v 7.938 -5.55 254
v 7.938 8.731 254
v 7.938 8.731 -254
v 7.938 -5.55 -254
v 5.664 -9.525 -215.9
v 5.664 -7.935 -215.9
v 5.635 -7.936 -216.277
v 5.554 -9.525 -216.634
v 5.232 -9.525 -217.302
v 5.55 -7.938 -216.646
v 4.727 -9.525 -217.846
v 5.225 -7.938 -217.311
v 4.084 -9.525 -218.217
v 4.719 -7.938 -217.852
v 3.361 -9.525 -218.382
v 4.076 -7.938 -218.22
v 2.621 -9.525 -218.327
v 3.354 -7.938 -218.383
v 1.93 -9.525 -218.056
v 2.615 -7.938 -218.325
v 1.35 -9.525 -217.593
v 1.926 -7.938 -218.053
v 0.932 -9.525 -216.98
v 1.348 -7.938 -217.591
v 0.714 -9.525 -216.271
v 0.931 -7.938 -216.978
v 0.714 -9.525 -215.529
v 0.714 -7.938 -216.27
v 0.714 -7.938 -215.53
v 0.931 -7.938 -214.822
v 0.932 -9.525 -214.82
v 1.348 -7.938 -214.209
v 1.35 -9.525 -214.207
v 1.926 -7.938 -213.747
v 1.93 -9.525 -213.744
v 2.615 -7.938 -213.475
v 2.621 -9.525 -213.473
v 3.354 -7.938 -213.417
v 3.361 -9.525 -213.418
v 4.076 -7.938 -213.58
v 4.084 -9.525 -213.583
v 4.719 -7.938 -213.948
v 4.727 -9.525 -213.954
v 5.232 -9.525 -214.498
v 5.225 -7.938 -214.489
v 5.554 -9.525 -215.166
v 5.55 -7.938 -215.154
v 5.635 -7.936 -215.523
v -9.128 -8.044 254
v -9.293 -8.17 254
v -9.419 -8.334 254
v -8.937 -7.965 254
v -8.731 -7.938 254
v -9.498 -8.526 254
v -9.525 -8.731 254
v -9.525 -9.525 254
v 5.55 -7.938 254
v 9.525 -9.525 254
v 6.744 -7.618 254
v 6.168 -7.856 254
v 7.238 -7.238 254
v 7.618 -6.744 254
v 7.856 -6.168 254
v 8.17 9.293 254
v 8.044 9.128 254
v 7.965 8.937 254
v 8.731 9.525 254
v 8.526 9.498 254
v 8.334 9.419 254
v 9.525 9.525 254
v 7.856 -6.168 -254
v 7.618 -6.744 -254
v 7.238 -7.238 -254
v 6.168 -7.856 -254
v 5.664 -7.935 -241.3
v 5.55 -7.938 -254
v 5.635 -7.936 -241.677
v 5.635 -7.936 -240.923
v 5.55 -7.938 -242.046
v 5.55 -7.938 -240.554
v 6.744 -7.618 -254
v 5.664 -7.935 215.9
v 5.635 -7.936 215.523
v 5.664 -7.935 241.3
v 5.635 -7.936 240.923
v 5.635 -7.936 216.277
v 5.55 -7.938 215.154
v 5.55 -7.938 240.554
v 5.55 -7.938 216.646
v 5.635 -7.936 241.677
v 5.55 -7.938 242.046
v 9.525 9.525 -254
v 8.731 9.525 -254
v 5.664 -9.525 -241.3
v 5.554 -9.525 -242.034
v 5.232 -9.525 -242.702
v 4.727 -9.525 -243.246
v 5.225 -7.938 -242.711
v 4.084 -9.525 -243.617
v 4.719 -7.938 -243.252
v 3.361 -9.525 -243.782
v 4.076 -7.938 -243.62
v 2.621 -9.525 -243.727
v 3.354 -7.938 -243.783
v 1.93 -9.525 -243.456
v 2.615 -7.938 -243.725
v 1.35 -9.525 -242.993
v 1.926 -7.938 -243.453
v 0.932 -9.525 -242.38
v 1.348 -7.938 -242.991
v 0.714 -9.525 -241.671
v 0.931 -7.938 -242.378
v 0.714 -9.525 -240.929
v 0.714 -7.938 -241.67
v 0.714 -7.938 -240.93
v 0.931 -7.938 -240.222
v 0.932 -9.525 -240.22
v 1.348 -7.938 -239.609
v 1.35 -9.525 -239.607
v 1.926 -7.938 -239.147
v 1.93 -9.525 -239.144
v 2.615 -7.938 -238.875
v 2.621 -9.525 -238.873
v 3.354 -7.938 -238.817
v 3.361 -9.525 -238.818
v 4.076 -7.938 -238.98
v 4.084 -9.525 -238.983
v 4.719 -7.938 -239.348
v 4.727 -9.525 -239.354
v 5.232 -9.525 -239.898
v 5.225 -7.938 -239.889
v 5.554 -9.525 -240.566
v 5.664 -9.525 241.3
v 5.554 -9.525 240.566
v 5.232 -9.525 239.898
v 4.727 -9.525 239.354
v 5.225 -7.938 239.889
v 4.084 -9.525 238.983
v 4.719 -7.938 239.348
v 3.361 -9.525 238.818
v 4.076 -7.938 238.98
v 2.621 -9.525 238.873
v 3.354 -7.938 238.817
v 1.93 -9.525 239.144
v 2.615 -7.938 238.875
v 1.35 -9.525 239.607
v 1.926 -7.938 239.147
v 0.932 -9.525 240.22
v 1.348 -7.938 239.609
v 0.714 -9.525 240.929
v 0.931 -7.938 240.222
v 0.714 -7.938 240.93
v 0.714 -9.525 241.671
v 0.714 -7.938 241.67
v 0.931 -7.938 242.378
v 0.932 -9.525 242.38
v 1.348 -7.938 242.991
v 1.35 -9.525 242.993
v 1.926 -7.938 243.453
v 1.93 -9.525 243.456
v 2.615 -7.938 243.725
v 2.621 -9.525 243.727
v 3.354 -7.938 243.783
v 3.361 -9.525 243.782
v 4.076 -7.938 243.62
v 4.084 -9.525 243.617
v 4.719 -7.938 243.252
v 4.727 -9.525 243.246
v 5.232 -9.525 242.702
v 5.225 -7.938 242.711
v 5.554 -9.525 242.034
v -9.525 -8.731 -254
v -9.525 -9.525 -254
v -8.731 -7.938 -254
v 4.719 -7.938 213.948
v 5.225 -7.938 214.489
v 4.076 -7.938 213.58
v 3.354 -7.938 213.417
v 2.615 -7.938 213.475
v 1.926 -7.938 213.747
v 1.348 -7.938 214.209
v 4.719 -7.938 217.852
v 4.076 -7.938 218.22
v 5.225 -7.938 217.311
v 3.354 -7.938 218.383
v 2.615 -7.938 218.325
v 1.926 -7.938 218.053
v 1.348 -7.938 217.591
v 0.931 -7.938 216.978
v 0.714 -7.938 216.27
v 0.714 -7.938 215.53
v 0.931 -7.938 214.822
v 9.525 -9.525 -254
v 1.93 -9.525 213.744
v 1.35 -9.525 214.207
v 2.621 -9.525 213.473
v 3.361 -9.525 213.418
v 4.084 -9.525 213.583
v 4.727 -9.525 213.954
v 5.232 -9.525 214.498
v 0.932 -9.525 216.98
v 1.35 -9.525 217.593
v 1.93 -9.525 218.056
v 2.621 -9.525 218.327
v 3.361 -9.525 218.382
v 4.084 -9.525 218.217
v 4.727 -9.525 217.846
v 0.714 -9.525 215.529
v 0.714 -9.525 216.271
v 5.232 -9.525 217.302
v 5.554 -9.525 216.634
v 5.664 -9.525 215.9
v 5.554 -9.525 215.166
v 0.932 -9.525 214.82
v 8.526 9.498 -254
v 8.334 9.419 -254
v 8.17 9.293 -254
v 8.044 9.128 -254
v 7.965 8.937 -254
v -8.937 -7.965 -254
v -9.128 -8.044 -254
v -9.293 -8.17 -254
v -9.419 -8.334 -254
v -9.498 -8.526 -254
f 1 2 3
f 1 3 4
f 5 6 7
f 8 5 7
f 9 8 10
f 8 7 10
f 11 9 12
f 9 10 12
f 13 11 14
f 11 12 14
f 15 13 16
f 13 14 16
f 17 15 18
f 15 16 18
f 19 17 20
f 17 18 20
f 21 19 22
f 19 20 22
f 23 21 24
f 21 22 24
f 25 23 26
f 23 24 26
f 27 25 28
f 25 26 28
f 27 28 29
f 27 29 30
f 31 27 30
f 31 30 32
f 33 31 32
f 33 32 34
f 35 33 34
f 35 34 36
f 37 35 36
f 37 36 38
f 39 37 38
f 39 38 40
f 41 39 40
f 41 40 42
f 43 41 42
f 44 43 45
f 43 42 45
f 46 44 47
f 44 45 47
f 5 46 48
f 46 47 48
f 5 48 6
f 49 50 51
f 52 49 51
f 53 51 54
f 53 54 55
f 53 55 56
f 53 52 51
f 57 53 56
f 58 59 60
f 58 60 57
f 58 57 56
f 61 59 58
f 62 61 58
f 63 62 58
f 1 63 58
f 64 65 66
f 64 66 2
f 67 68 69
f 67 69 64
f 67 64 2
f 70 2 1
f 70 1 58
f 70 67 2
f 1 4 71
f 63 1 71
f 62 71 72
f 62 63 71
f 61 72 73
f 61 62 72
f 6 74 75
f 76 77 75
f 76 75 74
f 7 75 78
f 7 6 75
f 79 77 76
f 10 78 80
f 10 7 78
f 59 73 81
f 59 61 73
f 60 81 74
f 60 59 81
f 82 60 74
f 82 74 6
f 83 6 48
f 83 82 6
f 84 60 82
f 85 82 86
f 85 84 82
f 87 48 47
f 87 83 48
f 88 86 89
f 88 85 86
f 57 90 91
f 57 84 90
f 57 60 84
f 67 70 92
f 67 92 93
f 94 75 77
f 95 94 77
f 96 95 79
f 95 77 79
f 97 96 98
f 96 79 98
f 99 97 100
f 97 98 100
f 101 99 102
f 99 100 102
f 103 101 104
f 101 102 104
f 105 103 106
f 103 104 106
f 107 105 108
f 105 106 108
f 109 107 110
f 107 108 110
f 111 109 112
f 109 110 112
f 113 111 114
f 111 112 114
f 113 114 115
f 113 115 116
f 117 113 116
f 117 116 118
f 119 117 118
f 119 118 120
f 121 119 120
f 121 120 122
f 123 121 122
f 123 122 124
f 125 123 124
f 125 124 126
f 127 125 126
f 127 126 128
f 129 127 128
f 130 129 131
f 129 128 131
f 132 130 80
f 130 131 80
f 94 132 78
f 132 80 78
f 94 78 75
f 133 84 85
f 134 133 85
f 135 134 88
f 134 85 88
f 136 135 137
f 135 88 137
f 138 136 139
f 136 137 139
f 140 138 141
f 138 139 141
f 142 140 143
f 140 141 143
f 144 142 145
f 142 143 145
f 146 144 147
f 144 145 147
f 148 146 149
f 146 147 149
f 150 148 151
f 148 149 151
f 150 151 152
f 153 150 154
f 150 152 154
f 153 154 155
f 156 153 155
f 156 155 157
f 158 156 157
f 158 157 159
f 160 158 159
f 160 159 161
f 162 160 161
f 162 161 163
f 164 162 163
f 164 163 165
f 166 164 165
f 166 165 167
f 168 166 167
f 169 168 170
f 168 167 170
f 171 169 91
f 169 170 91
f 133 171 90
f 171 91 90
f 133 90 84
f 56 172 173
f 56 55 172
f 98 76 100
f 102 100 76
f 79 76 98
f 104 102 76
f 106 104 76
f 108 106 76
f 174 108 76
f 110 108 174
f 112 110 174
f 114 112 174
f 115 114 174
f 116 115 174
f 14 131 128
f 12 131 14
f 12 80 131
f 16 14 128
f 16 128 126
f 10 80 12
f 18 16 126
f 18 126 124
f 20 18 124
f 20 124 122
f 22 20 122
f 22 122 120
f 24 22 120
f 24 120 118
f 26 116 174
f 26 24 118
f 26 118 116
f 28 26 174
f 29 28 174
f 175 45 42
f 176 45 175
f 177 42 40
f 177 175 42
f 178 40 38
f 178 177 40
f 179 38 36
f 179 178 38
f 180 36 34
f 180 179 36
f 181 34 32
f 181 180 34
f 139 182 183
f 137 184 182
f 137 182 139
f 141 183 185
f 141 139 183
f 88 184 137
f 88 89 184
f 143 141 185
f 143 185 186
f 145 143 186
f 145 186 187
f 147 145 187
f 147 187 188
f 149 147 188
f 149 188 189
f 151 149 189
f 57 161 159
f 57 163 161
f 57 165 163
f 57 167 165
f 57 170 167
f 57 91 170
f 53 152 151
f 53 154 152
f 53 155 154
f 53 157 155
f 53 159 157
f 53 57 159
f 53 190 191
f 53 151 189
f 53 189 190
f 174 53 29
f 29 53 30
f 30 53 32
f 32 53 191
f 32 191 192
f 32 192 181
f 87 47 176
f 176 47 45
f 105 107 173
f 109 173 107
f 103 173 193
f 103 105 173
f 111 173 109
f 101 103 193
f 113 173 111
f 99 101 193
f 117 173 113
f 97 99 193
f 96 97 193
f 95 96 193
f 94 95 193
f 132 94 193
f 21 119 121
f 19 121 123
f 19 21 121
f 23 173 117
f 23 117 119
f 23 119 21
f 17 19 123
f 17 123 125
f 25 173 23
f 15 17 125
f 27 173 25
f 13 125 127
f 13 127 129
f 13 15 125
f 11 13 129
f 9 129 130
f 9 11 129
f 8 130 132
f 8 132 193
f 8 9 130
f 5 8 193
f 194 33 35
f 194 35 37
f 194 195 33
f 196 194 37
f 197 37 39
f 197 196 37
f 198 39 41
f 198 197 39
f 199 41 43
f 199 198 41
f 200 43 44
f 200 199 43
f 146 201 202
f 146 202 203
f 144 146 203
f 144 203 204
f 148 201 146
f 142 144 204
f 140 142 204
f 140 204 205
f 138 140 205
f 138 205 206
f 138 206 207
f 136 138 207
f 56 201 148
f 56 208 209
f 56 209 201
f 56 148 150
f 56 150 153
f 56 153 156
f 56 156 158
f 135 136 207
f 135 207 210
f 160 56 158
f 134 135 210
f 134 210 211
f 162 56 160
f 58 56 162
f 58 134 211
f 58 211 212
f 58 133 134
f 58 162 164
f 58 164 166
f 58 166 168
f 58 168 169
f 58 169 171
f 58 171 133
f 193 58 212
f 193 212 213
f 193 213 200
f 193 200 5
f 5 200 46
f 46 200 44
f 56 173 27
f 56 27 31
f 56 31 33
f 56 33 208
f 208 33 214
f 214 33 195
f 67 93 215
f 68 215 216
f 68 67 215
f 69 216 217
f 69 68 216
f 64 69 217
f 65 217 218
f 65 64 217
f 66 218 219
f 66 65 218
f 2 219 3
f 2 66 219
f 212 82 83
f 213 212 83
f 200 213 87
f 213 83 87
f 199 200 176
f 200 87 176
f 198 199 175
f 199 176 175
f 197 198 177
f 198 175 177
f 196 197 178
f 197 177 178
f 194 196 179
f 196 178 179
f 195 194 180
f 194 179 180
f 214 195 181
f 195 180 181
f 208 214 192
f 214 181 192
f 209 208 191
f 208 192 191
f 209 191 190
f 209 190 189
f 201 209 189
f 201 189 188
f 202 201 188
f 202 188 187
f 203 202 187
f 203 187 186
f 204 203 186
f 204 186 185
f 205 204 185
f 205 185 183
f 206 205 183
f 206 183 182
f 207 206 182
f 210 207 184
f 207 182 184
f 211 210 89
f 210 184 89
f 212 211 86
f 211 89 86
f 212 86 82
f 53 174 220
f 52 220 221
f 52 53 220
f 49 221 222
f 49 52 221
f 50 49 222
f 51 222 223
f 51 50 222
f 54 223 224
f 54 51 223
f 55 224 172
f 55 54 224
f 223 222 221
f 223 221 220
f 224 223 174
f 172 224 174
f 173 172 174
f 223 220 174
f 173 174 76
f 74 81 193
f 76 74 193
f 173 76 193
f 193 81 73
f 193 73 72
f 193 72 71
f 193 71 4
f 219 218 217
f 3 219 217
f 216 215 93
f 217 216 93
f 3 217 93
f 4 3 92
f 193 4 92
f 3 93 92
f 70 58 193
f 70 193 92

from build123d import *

# Parameters (mm, degrees)
BOSS_EXTRUDE1_DEPTH        = 254
F_10_CLEARANCE_HOLE1_D     = 4.9784
F_10_CLEARANCE_HOLE1_DEPTH = 3.302
F_10_CLEARANCE_HOLE1_TIP   = 1.495662253


with BuildPart() as part:
    # Sketch2 → Boss-Extrude1 (new, symmetric)
    with BuildSketch(Plane.XY):
        with BuildLine():
            Line((-9.525, -9.525), (9.525, -9.525))
            Line((9.525, -9.525), (9.525, 9.525))
            Line((9.525, 9.525), (8.73125, 9.525))
            ThreePointArc((8.73125, 9.525), (8.169983992, 9.292516008), (7.9375, 8.73125))
            Line((7.9375, 8.73125), (7.9375, -5.5499))
            ThreePointArc((7.9375, -5.5499), (7.238188151, -7.238188151), (5.5499, -7.9375))
            Line((5.5499, -7.9375), (-8.73125, -7.9375))
            ThreePointArc((-8.73125, -7.9375), (-9.292516008, -8.169983992), (-9.525, -8.73125))
            Line((-9.525, -8.73125), (-9.525, -9.525))
        make_face()
    extrude(amount=BOSS_EXTRUDE1_DEPTH, both=True)

    # #10 Clearance Hole1
    with Locations(Plane(origin=(0, -9.525, 0), x_dir=(-1, 0, 0), z_dir=(0, -1, 0))):
        with Locations((-3.175, 241.3), (-3.175, 215.9), (-3.175, -241.3), (-3.175, -215.9)):
            Hole(F_10_CLEARANCE_HOLE1_D / 2, depth=F_10_CLEARANCE_HOLE1_DEPTH)
            with Locations((0, 0, -(F_10_CLEARANCE_HOLE1_DEPTH + F_10_CLEARANCE_HOLE1_TIP / 2))):  # 118° drill point
                Cone(0, F_10_CLEARANCE_HOLE1_D / 2, F_10_CLEARANCE_HOLE1_TIP, mode=Mode.SUBTRACT)


solid = part.part
